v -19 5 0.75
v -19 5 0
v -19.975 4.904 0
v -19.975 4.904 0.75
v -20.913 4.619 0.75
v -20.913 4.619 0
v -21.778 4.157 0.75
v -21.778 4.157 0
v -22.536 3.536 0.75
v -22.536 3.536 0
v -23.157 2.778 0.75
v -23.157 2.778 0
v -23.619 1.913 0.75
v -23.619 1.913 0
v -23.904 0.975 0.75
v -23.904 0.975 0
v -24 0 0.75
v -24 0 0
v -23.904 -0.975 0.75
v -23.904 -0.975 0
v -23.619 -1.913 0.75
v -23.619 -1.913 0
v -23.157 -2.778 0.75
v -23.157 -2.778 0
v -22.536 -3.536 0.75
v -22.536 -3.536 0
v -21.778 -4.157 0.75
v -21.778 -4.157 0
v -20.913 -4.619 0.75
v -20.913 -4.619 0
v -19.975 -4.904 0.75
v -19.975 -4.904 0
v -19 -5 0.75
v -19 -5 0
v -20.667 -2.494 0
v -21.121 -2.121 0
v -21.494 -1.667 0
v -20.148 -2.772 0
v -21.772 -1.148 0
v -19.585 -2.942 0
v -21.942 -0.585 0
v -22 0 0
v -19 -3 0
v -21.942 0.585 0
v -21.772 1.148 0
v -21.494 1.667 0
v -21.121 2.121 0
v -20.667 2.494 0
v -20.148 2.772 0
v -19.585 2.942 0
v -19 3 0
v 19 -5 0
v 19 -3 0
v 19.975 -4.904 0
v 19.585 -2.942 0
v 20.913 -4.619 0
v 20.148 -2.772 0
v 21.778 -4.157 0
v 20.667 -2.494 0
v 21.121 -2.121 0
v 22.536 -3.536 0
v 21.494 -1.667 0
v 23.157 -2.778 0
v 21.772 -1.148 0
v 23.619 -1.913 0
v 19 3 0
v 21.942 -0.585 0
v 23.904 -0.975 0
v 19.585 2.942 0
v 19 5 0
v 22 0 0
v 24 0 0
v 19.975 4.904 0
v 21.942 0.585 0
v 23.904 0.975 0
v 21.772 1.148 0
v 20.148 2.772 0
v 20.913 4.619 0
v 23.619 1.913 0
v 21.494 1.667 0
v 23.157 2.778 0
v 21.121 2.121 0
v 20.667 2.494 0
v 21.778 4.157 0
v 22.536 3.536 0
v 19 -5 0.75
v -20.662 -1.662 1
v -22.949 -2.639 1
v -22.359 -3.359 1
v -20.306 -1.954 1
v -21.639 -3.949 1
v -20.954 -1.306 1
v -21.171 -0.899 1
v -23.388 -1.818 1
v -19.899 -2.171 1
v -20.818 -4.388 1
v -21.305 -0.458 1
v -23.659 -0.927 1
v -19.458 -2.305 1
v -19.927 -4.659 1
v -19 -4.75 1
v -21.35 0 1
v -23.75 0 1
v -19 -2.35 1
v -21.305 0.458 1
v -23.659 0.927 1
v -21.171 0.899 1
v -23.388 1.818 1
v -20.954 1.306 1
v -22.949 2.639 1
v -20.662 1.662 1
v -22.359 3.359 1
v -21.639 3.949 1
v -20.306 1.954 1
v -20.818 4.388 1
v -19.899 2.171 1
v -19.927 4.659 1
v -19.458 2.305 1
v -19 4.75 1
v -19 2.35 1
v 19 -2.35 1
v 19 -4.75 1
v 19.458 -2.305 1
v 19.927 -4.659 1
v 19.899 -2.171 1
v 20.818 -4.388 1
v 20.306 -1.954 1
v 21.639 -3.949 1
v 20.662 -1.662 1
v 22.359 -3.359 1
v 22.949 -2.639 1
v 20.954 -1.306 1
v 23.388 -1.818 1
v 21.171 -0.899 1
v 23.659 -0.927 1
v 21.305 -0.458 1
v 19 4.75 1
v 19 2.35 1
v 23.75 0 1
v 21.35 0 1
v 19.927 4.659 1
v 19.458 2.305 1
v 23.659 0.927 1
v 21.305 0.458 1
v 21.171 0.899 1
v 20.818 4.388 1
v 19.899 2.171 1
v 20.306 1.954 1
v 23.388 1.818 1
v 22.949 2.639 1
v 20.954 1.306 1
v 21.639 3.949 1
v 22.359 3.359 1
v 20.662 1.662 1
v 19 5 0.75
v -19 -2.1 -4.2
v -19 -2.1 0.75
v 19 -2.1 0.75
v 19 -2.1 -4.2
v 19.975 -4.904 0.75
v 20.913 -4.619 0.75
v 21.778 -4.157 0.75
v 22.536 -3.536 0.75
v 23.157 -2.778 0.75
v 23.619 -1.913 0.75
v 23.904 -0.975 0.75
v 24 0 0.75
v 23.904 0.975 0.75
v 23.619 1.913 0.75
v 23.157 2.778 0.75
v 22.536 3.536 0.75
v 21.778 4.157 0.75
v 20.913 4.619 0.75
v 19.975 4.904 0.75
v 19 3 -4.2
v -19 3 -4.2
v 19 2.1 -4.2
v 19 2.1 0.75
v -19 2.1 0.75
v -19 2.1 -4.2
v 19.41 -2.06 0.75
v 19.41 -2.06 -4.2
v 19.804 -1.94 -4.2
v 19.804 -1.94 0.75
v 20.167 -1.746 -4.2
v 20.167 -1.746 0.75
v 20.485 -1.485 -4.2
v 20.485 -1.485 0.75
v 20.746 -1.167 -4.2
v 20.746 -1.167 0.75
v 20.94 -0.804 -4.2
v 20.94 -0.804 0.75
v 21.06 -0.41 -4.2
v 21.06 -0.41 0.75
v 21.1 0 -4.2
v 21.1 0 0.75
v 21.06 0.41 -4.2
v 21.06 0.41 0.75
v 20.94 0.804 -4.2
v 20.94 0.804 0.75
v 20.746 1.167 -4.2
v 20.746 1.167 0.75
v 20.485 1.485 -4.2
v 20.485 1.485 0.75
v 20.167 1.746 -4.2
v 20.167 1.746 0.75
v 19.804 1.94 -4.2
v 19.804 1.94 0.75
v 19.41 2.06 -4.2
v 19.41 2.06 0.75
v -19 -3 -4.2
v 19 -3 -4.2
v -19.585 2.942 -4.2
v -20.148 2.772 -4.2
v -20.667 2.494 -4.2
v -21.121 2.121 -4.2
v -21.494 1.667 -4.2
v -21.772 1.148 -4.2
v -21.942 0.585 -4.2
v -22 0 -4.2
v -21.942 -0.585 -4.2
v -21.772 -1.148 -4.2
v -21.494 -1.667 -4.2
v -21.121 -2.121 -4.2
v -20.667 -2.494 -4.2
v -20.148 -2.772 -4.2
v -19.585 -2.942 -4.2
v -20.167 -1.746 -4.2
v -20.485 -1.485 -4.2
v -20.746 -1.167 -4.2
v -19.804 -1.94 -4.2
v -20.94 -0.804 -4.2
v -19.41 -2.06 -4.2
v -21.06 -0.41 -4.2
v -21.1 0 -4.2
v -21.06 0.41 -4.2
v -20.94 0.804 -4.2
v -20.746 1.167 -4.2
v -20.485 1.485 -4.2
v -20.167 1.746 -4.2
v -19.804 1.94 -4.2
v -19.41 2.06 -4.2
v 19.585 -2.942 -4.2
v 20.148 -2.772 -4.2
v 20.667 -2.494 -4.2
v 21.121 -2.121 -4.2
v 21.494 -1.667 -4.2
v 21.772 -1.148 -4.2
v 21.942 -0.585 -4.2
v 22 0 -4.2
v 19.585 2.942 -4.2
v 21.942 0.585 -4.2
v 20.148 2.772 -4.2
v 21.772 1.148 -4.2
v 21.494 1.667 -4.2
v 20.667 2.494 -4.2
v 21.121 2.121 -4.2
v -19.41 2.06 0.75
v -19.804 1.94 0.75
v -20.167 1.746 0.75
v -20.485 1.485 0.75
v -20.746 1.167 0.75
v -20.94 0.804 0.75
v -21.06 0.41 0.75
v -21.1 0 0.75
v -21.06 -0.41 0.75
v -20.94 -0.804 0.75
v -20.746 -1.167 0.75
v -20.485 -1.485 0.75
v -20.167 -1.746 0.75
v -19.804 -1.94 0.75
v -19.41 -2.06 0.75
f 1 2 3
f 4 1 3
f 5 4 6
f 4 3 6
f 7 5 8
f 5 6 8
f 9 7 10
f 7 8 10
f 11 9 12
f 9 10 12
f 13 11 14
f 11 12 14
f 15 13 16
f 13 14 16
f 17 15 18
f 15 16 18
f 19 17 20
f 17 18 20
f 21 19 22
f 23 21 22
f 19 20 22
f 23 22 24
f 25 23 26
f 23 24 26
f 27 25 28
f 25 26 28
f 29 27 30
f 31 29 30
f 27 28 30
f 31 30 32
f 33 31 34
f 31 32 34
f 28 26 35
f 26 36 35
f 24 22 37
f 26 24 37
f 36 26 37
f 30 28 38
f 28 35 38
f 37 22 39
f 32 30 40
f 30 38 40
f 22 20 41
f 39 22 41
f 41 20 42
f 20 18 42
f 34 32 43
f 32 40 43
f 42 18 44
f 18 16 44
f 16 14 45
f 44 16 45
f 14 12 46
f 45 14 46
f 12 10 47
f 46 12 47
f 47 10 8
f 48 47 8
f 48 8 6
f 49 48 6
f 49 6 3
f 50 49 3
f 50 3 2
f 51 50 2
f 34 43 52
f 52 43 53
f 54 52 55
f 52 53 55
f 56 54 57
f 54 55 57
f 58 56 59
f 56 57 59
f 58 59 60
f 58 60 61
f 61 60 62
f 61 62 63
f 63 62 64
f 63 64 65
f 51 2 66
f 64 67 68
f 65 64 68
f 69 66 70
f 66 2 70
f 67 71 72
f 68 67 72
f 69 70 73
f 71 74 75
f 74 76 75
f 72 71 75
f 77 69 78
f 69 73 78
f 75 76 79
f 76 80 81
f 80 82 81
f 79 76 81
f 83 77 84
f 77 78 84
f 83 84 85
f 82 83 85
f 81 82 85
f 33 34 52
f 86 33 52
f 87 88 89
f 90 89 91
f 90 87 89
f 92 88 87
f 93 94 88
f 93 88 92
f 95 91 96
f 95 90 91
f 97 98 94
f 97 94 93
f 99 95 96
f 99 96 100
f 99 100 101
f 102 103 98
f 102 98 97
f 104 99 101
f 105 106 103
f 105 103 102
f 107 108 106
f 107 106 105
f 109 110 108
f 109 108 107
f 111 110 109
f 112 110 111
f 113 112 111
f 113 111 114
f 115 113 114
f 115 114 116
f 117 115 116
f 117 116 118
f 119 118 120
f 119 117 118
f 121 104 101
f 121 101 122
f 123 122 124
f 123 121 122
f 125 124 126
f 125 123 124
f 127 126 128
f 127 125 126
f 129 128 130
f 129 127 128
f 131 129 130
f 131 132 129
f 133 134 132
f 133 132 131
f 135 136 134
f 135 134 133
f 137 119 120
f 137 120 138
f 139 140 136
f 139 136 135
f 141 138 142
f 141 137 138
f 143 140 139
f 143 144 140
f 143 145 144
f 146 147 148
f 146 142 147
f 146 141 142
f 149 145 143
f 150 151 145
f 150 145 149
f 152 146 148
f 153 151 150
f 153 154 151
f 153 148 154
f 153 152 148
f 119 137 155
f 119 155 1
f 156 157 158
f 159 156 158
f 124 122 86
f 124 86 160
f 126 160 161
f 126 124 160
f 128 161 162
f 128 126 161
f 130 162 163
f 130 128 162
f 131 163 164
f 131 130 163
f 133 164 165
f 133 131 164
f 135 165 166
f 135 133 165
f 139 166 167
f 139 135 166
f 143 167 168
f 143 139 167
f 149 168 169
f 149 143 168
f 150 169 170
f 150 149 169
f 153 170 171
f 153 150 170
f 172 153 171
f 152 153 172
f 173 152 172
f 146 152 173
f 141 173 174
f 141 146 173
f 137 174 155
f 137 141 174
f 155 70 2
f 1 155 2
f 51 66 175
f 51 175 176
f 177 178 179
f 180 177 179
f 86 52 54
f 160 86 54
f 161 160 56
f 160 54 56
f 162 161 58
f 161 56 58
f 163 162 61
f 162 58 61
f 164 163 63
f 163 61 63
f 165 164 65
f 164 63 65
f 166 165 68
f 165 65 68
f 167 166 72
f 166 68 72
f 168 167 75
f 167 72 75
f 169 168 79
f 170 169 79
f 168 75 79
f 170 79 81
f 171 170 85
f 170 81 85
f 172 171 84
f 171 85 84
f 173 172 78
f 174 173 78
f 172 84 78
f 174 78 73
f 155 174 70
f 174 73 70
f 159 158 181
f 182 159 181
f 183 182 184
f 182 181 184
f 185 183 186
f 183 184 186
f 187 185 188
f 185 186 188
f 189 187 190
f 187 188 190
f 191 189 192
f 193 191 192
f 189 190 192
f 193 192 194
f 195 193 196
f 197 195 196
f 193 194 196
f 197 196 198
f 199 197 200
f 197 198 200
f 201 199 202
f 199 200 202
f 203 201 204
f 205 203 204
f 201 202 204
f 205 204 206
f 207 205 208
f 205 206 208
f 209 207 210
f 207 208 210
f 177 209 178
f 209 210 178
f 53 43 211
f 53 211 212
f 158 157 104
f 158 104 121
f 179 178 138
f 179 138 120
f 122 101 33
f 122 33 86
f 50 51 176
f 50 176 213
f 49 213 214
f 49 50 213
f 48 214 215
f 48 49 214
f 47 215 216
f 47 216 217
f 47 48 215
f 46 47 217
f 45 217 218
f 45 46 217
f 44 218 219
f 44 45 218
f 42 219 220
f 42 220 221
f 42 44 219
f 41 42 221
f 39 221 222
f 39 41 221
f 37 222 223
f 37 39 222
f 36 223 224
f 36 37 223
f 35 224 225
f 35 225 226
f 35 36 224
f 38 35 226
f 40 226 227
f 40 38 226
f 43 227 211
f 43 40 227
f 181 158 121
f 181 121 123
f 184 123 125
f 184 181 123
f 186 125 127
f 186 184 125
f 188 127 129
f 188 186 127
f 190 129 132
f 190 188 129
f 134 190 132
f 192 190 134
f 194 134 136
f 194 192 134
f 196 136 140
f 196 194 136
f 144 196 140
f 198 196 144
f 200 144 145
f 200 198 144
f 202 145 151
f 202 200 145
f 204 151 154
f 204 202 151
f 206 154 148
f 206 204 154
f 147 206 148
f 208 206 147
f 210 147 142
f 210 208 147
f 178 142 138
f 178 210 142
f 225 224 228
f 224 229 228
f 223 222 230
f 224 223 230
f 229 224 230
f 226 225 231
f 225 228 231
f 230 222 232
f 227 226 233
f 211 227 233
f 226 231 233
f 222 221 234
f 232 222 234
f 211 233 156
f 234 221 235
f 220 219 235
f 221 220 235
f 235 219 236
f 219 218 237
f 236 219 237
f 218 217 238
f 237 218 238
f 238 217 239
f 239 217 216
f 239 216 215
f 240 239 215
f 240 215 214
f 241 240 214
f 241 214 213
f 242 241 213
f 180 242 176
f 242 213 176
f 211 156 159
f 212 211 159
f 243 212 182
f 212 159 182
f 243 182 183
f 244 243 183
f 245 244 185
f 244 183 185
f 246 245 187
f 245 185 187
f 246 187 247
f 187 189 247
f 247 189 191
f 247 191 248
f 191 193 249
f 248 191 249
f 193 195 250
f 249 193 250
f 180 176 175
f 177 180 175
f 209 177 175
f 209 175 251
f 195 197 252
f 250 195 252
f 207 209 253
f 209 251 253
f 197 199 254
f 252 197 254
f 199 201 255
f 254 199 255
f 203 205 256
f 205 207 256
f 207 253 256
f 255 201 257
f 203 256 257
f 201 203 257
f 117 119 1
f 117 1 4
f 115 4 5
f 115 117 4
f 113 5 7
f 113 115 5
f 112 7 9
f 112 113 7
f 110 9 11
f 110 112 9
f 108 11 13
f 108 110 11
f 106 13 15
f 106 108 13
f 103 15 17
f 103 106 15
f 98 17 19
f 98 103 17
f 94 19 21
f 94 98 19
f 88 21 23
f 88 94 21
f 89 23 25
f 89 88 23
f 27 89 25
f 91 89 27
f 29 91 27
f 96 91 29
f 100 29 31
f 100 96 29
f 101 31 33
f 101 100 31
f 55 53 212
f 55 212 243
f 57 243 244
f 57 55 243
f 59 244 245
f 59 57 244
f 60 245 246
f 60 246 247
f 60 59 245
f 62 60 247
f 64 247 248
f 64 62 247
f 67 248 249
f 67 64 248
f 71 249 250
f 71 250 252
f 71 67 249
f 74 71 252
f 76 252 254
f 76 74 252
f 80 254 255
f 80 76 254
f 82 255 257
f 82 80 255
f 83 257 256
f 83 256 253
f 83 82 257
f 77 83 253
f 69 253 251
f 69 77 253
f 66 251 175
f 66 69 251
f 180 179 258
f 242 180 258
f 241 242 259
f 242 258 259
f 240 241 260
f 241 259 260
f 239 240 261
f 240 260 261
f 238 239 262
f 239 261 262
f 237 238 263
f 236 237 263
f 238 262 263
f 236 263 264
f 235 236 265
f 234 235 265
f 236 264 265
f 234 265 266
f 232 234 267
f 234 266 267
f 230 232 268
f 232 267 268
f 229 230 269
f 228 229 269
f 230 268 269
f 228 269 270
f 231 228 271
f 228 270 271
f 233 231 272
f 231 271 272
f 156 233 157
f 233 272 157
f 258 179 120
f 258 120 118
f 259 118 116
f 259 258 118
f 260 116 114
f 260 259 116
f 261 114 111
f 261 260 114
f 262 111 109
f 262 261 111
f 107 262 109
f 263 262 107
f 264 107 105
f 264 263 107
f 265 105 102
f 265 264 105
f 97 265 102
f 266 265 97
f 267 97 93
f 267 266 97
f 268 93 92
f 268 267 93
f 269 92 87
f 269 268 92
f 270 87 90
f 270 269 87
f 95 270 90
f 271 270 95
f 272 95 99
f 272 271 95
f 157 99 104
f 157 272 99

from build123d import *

# Parameters (mm, degrees)
F1_DEPTH = 4.2
F3_DEPTH = 1
F5_DEPTH = 5.201
F6_SIZE  = 0.25


with BuildPart() as f1:
    # F0 (on Top) → F1 (new body)
    with BuildSketch(Plane.XY):
        with BuildLine():
            Line((19, 3), (-19, 3))
            ThreePointArc((-19, 3), (-22, 0), (-19, -3))
            Line((-19, -3), (19, -3))
            ThreePointArc((19, -3), (22, 0), (19, 3))
        make_face()
    extrude(amount=-F1_DEPTH)

    # F2 (on face) → F3 (join)
    with BuildSketch(Plane.XY):
        with BuildLine():
            ThreePointArc((-19, 5), (-24, 0), (-19, -5))
            Line((-19, -5), (19, -5))
            ThreePointArc((19, -5), (24, 0), (19, 5))
            Line((19, 5), (-19, 5))
        make_face()
    extrude(amount=F3_DEPTH)

    # F4 (on face) → F5 (cut, through all)
    with BuildSketch(Plane.XY.offset(1)):
        with BuildLine():
            Line((-19, -2.1), (19, -2.1))
            ThreePointArc((19, -2.1), (21.1, 0), (19, 2.1))
            Line((19, 2.1), (-19, 2.1))
            ThreePointArc((-19, 2.1), (-21.1, 0), (-19, -2.1))
        make_face()
    extrude(amount=-F5_DEPTH, mode=Mode.SUBTRACT)

    # F6
    f6_edges = [f1.edges().sort_by_distance(p)[0] for p in [
        (-24, 0, 1),
        (0, 5, 1),
        (0, -5, 1),
        (24, 0, 1),
        (0, -2.1, 1),
        (21.1, 0, 1),
        (0, 2.1, 1),
        (-21.1, 0, 1),
    ]]
    chamfer(f6_edges, length=F6_SIZE)


solid = f1.part
